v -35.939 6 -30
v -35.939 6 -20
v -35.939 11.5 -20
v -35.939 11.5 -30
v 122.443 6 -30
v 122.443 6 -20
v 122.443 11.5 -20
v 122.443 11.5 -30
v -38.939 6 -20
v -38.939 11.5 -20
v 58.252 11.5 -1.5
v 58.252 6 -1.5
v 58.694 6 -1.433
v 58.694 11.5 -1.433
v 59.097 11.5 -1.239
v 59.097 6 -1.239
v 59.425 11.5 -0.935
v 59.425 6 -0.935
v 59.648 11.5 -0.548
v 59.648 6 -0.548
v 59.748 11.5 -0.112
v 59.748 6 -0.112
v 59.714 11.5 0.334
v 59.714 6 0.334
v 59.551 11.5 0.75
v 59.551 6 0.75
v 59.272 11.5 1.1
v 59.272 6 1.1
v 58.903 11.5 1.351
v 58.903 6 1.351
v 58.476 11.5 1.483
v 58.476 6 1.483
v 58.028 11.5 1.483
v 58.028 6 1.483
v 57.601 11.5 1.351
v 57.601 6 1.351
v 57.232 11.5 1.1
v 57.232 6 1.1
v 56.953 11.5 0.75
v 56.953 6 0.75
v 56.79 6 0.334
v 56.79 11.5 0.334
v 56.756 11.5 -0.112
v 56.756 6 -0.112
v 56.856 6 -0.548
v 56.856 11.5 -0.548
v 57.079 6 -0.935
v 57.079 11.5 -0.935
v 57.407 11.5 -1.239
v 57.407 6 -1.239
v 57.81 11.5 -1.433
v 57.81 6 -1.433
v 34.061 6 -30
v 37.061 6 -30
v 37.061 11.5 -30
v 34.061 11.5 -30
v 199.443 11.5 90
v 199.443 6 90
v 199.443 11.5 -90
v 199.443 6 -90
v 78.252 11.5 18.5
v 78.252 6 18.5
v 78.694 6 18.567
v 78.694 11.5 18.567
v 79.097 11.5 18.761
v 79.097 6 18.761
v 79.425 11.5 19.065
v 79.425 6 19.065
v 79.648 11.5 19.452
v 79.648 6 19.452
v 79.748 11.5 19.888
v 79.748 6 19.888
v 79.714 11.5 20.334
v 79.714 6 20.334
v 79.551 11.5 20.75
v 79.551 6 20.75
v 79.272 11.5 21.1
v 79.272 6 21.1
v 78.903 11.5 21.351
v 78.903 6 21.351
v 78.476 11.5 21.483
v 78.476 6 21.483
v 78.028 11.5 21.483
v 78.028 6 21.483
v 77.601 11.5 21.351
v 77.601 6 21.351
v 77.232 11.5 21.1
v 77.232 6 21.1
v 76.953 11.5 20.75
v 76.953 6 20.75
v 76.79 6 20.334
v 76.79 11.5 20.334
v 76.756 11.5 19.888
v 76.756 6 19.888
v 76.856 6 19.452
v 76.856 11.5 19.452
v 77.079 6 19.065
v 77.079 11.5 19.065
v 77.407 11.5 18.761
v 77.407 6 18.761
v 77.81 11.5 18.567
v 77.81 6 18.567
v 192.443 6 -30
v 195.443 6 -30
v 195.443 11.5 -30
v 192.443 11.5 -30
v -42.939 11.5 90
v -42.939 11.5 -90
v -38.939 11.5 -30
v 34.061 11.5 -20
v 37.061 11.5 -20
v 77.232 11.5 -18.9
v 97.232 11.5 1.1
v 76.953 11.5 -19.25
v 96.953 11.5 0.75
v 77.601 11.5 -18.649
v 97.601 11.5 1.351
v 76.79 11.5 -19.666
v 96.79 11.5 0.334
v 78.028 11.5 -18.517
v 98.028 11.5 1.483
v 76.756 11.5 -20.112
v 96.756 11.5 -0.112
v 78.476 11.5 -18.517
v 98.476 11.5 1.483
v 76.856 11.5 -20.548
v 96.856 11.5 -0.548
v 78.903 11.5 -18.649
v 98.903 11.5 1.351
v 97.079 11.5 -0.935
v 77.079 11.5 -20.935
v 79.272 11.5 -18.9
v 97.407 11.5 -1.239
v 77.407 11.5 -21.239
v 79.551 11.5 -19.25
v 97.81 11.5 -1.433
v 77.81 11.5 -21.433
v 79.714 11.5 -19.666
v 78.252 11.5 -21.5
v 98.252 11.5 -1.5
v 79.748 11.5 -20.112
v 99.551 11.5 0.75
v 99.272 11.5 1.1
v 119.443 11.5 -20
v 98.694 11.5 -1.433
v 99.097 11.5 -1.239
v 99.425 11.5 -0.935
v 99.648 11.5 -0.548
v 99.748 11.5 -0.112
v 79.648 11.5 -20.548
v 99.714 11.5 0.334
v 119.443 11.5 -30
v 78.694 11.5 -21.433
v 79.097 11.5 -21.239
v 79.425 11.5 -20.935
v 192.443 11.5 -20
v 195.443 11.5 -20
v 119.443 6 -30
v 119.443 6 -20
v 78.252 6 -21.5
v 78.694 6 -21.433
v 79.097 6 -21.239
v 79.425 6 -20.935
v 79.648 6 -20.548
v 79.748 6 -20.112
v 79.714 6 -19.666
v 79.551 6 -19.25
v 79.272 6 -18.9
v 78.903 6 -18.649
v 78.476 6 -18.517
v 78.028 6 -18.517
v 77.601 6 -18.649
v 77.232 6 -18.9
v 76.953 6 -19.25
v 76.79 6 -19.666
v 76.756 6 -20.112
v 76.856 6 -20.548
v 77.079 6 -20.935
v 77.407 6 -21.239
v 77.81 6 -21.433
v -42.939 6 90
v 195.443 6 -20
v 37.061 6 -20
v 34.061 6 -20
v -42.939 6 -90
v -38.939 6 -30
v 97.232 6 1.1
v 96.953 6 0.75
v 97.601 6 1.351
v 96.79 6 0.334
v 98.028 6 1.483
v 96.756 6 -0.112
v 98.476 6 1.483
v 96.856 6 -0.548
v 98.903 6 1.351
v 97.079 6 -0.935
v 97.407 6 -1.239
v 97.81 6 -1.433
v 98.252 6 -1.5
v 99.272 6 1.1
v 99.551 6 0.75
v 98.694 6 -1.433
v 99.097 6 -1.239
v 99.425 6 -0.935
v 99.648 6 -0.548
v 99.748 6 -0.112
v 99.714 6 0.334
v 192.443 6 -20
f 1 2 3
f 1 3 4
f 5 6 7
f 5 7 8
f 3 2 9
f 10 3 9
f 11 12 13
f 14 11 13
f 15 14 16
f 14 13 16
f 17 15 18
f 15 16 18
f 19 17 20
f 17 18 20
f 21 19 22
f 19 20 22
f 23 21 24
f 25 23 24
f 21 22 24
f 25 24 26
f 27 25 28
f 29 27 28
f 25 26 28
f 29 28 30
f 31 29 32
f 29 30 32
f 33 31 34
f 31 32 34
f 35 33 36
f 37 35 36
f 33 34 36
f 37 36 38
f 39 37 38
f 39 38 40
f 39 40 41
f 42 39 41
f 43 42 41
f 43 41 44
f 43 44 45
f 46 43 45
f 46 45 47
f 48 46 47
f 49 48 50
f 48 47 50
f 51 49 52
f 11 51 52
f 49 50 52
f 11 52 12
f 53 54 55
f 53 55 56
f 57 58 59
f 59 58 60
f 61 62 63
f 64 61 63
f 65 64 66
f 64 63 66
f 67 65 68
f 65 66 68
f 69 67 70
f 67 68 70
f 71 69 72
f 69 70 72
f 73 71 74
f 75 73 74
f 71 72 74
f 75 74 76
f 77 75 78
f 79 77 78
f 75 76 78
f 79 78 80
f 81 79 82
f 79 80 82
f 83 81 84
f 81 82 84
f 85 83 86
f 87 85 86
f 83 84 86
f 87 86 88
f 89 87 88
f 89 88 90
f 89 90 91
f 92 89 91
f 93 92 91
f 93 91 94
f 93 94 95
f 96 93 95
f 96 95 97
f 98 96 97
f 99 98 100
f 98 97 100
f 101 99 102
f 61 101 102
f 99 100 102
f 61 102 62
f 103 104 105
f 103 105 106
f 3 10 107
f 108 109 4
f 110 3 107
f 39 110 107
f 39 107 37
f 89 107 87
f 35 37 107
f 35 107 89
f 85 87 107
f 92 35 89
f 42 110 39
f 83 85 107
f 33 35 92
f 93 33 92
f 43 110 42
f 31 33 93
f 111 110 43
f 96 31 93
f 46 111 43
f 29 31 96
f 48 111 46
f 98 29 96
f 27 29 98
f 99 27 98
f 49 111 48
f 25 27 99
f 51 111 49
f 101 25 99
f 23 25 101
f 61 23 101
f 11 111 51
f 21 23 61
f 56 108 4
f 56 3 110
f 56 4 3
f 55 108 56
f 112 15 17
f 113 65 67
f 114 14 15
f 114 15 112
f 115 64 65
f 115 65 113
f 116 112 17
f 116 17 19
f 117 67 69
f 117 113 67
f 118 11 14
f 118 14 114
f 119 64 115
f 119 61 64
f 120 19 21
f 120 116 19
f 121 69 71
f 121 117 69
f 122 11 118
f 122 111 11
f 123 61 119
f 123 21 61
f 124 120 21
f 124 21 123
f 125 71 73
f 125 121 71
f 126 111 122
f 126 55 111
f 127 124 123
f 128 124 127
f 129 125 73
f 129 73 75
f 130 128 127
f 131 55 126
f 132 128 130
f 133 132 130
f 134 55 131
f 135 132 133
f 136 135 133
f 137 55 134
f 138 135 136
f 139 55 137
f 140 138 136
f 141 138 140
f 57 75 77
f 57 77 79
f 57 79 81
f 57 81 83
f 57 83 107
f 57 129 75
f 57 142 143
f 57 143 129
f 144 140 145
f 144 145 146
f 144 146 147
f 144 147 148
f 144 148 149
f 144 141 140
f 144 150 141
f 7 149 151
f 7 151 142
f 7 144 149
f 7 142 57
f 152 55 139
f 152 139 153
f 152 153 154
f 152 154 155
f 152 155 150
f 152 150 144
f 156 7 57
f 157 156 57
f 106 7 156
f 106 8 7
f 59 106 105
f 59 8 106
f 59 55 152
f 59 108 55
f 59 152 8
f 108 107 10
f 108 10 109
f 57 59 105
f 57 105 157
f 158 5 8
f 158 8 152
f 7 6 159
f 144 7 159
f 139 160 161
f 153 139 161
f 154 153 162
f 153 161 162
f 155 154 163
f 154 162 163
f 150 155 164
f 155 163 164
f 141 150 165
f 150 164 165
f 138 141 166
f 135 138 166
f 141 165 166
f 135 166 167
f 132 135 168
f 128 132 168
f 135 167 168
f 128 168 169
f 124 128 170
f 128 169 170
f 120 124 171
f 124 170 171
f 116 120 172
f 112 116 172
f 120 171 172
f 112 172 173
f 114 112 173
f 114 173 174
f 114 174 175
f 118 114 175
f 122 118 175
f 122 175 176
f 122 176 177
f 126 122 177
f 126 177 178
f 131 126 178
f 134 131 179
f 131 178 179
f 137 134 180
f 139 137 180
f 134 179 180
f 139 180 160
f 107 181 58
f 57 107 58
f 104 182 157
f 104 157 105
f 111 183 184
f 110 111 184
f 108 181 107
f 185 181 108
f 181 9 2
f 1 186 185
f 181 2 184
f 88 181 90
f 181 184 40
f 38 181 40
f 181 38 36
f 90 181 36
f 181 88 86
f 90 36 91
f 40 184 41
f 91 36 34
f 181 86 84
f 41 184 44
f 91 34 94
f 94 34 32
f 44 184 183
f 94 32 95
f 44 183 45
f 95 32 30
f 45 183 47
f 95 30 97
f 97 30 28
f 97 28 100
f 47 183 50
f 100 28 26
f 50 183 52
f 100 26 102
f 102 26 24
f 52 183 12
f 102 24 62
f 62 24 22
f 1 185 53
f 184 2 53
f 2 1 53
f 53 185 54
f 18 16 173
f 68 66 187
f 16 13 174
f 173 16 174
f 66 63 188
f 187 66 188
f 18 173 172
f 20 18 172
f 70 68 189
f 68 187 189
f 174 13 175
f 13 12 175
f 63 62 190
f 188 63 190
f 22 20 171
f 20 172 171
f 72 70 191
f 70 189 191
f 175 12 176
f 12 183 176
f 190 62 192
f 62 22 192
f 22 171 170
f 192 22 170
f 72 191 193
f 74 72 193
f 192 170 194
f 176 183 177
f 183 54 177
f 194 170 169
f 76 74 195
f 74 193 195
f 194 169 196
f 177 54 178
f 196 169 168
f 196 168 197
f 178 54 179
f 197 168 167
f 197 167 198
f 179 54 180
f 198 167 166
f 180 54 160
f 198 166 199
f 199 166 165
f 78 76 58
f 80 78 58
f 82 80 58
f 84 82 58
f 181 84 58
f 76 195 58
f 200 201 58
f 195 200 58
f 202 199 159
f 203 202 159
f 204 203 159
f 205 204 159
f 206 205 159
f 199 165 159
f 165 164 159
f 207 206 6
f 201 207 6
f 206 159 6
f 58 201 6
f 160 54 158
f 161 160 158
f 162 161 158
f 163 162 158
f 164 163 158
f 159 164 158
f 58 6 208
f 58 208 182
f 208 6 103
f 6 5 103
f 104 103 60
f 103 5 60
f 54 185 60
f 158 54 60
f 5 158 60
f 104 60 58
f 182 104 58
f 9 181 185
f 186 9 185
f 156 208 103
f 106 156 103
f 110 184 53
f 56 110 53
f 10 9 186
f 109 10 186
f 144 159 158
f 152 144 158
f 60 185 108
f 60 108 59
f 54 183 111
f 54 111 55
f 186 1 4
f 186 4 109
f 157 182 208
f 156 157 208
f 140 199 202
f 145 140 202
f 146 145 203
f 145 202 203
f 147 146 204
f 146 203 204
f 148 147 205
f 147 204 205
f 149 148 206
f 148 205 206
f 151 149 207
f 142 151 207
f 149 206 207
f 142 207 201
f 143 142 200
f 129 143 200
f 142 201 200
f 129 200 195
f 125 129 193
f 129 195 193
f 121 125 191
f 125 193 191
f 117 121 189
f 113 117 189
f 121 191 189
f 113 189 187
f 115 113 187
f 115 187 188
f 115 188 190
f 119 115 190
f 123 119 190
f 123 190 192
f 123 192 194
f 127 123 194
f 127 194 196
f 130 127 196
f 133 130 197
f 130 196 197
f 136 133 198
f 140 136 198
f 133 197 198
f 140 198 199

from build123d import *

# Parameters (mm, degrees)
CROQUIS1_W              = 140
CROQUIS1_H              = 110
CROQUIS1_R              = 1.75
CROQUIS1_R_2            = 1.7
SALIENTE_EXTRUIR1_DEPTH = 6
REDONDEO1_R             = 8
REDONDEO2_R             = 8
CROQUIS2_W              = 42.672269
CROQUIS2_H              = 112.197382
CORTAR_EXTRUIR1_DEPTH   = 10
CROQUIS3_W              = 36.240418
CROQUIS3_H              = 110
SALIENTE_EXTRUIR2_DEPTH = 6
CROQUIS4_W              = 130
CROQUIS4_H              = 44.342948
CROQUIS4_H_2            = 44.315965
SALIENTE_EXTRUIR3_DEPTH = 6
REDONDEO3_R             = 10
REDONDEO4_R             = 10
CORTAR_EXTRUIR2_START   = -10
CORTAR_EXTRUIR2_DEPTH   = 10
SALIENTE_EXTRUIR4_START = -6
SALIENTE_EXTRUIR4_DEPTH = 6
CROQUIS7_W              = 242.381537
CROQUIS7_H              = 180
SALIENTE_EXTRUIR5_DEPTH = 5.5
CROQUIS8_R              = 1.5
CORTAR_EXTRUIR3_DEPTH   = 5.5
CROQUIS9_W              = 227.16044
CROQUIS9_H              = 250.882891
CORTAR_EXTRUIR5_DEPTH   = 6
CROQUIS10_W             = 3
CROQUIS10_H             = 10
CORTAR_EXTRUIR6_DEPTH   = 6


with BuildPart() as part:
    # Croquis1 → Saliente-Extruir1 (new body)
    with BuildSketch(Plane(origin=(0, 0, 0), x_dir=(1, 0, 0), z_dir=(0, 1, 0))):
        Rectangle(CROQUIS1_W, CROQUIS1_H)
        with Locations(Location((0, 20, 0), (0, 0, 270))):
            Circle(CROQUIS1_R, mode=Mode.SUBTRACT)
        with Locations(Location((20, 0, 0), (0, 0, 270))):
            Circle(CROQUIS1_R_2, mode=Mode.SUBTRACT)
        with Locations(Location((-20, 0, 0), (0, 0, 270))):
            Circle(CROQUIS1_R_2, mode=Mode.SUBTRACT)
        with Locations(Location((0, -20, 0), (0, 0, 270))):
            Circle(CROQUIS1_R_2, mode=Mode.SUBTRACT)
    extrude(amount=SALIENTE_EXTRUIR1_DEPTH)

    # Redondeo1
    redondeo1_edges = [part.edges().sort_by_distance(p)[0] for p in [
        (70, 3, 55),
        (-70, 3, 55),
        (-70, 3, -55),
    ]]
    fillet(redondeo1_edges, radius=REDONDEO1_R)

    # Redondeo2
    redondeo2_edges = [part.edges().sort_by_distance(p)[0] for p in [
        (70, 3, -55),
    ]]
    fillet(redondeo2_edges, radius=REDONDEO2_R)

    # Croquis2 → Cortar-Extruir1 (cut)
    with BuildSketch(Plane(origin=(0, 6, 0), x_dir=(1, 0, 0), z_dir=(0, 1, 0))):
        with Locations((-64.336135, -1.098691)):
            Rectangle(CROQUIS2_W, CROQUIS2_H)
    extrude(amount=-CORTAR_EXTRUIR1_DEPTH, mode=Mode.SUBTRACT)

    # Croquis3 → Saliente-Extruir2 (add)
    with BuildSketch(Plane(origin=(0, 6, 0), x_dir=(1, 0, 0), z_dir=(0, 1, 0))):
        with Locations((68.879791, 0)):
            Rectangle(CROQUIS3_W, CROQUIS3_H)
    extrude(amount=-SALIENTE_EXTRUIR2_DEPTH)

    # Croquis4 → Saliente-Extruir3 (add)
    with BuildSketch(Plane(origin=(0, 6, 0), x_dir=(1, 0, 0), z_dir=(0, 1, 0))):
        with Locations((22, -64.828526)):
            Rectangle(CROQUIS4_W, CROQUIS4_H)
        with Locations((22, 64.842017)):
            Rectangle(CROQUIS4_W, CROQUIS4_H_2)
    extrude(amount=-SALIENTE_EXTRUIR3_DEPTH)

    # Redondeo3
    redondeo3_edges = [part.edges().sort_by_distance(p)[0] for p in [
        (-43, 3, 87),
        (87, 3, 87),
        (87, 3, -87),
    ]]
    fillet(redondeo3_edges, radius=REDONDEO3_R)

    # Redondeo4
    redondeo4_edges = [part.edges().sort_by_distance(p)[0] for p in [
        (-43, 3, -87),
    ]]
    fillet(redondeo4_edges, radius=REDONDEO4_R)

    # Croquis5 → Cortar-Extruir2 (cut)
    with BuildSketch(Plane(origin=(0, 6, 0), x_dir=(1, 0, 0), z_dir=(0, 1, 0)).offset(CORTAR_EXTRUIR2_START)):
        with BuildLine():
            Line((77, 87), (23.043437, 87))
            ThreePointArc((23.043437, 87), (63.63961, 63.63961), (87, 23.043437))
            Line((87, 23.043437), (87, 77))
            ThreePointArc((87, 77), (84.071068, 84.071068), (77, 87))
        make_face()
        with BuildLine():
            ThreePointArc((87, -23.043437), (63.63961, -63.63961), (23.043437, -87))
            Line((23.043437, -87), (77, -87))
            ThreePointArc((77, -87), (84.071068, -84.071068), (87, -77))
            Line((87, -77), (87, -23.043437))
        make_face()
        with BuildLine():
            ThreePointArc((-33, 87), (-39.24681, 84.8088), (-42.756019, 79.195473))
            ThreePointArc((-42.756019, 79.195473), (-33.130345, 83.680226), (-23.043437, 87))
            Line((-23.043437, 87), (-33, 87))
        make_face()
        with BuildLine():
            ThreePointArc((-23.043437, -87), (-33.130345, -83.680226), (-42.756019, -79.195473))
            ThreePointArc((-42.756019, -79.195473), (-39.24681, -84.8088), (-33, -87))
            Line((-33, -87), (-23.043437, -87))
        make_face()
    extrude(amount=CORTAR_EXTRUIR2_DEPTH, mode=Mode.SUBTRACT)

    # Croquis6 → Saliente-Extruir4 (add)
    with BuildSketch(Plane(origin=(0, 6, 0), x_dir=(1, 0, 0), z_dir=(0, 1, 0)).offset(SALIENTE_EXTRUIR4_START)):
        with BuildLine():
            Line((-39.173001, 81.027625), (47.945535, 76.165777))
            ThreePointArc((47.945535, 76.165777), (35.905482, 82.527549), (23.043437, 87))
            Line((23.043437, 87), (-23.043437, 87))
            ThreePointArc((-23.043437, 87), (-31.251218, 84.400008), (-39.173001, 81.027625))
        make_face()
        with BuildLine():
            Line((-23.043437, 87), (23.043437, 87))
            ThreePointArc((23.043437, 87), (0, 90), (-23.043437, 87))
        make_face()
        with BuildLine():
            Line((87, 23.043437), (87, -23.043437))
            ThreePointArc((87, -23.043437), (89.246849, -11.61895), (90, 0))
            ThreePointArc((90, 0), (89.246849, 11.61895), (87, 23.043437))
        make_face()
        with BuildLine():
            Line((72.080644, 53.892308), (75.372333, -49.183446))
            ThreePointArc((75.372333, -49.183446), (82.231494, -36.578427), (87, -23.043437))
            Line((87, -23.043437), (87, 23.043437))
            ThreePointArc((87, 23.043437), (81.022071, 39.184487), (72.080644, 53.892308))
        make_face()
        with BuildLine():
            ThreePointArc((23.043437, -87), (35.905482, -82.527549), (47.945535, -76.165777))
            Line((47.945535, -76.165777), (-35.565619, -82.674583))
            ThreePointArc((-35.565619, -82.674583), (-29.384225, -85.068016), (-23.043437, -87))
            Line((-23.043437, -87), (23.043437, -87))
        make_face()
        with BuildLine():
            ThreePointArc((-23.043437, -87), (0, -90), (23.043437, -87))
            Line((23.043437, -87), (-23.043437, -87))
        make_face()
    extrude(amount=SALIENTE_EXTRUIR4_DEPTH)

    # Croquis7 → Saliente-Extruir5 (add)
    with BuildSketch(Plane(origin=(0, 6, 0), x_dir=(1, 0, 0), z_dir=(0, 1, 0))):
        with Locations((78.25195, 0)):
            Rectangle(CROQUIS7_W, CROQUIS7_H)
    extrude(amount=SALIENTE_EXTRUIR5_DEPTH)

    # Croquis8 → Cortar-Extruir3 (cut)
    with BuildSketch(Plane(origin=(0, 6, 0), x_dir=(-1, 0, 0), z_dir=(0, -1, 0))):
        with Locations(Location((-98.251951, 0, 0), (0, 0, 90))):
            Circle(CROQUIS8_R)
        with Locations(Location((-78.251951, 20, 0), (0, 0, 90))):
            Circle(CROQUIS8_R)
        with Locations(Location((-58.251951, 0, 0), (0, 0, 90))):
            Circle(CROQUIS8_R)
        with Locations(Location((-78.251951, -20, 0), (0, 0, 90))):
            Circle(CROQUIS8_R)
    extrude(amount=-CORTAR_EXTRUIR3_DEPTH, mode=Mode.SUBTRACT)

    # Croquis9 → Cortar-Extruir5 (cut)
    with BuildSketch(Plane(origin=(0, 0, 0), x_dir=(-1, 0, 0), z_dir=(0, -1, 0))):
        with Locations((-10.648317, 7.188622)):
            Rectangle(CROQUIS9_W, CROQUIS9_H)
    extrude(amount=-CORTAR_EXTRUIR5_DEPTH, mode=Mode.SUBTRACT)

    # Croquis10 → Cortar-Extruir6 (cut)
    with BuildSketch(Plane(origin=(0, 6, 0), x_dir=(-1, 0, 0), z_dir=(0, -1, 0))):
        with Locations((37.438818, 25)):
            Rectangle(CROQUIS10_W, CROQUIS10_H)
        with Locations((-193.942719, 25)):
            Rectangle(CROQUIS10_W, CROQUIS10_H)
        with Locations((-35.561182, 25)):
            Rectangle(CROQUIS10_W, CROQUIS10_H)
        with Locations((-120.942719, 25)):
            Rectangle(CROQUIS10_W, CROQUIS10_H)
    extrude(amount=-CORTAR_EXTRUIR6_DEPTH, mode=Mode.SUBTRACT)


solid = part.part
